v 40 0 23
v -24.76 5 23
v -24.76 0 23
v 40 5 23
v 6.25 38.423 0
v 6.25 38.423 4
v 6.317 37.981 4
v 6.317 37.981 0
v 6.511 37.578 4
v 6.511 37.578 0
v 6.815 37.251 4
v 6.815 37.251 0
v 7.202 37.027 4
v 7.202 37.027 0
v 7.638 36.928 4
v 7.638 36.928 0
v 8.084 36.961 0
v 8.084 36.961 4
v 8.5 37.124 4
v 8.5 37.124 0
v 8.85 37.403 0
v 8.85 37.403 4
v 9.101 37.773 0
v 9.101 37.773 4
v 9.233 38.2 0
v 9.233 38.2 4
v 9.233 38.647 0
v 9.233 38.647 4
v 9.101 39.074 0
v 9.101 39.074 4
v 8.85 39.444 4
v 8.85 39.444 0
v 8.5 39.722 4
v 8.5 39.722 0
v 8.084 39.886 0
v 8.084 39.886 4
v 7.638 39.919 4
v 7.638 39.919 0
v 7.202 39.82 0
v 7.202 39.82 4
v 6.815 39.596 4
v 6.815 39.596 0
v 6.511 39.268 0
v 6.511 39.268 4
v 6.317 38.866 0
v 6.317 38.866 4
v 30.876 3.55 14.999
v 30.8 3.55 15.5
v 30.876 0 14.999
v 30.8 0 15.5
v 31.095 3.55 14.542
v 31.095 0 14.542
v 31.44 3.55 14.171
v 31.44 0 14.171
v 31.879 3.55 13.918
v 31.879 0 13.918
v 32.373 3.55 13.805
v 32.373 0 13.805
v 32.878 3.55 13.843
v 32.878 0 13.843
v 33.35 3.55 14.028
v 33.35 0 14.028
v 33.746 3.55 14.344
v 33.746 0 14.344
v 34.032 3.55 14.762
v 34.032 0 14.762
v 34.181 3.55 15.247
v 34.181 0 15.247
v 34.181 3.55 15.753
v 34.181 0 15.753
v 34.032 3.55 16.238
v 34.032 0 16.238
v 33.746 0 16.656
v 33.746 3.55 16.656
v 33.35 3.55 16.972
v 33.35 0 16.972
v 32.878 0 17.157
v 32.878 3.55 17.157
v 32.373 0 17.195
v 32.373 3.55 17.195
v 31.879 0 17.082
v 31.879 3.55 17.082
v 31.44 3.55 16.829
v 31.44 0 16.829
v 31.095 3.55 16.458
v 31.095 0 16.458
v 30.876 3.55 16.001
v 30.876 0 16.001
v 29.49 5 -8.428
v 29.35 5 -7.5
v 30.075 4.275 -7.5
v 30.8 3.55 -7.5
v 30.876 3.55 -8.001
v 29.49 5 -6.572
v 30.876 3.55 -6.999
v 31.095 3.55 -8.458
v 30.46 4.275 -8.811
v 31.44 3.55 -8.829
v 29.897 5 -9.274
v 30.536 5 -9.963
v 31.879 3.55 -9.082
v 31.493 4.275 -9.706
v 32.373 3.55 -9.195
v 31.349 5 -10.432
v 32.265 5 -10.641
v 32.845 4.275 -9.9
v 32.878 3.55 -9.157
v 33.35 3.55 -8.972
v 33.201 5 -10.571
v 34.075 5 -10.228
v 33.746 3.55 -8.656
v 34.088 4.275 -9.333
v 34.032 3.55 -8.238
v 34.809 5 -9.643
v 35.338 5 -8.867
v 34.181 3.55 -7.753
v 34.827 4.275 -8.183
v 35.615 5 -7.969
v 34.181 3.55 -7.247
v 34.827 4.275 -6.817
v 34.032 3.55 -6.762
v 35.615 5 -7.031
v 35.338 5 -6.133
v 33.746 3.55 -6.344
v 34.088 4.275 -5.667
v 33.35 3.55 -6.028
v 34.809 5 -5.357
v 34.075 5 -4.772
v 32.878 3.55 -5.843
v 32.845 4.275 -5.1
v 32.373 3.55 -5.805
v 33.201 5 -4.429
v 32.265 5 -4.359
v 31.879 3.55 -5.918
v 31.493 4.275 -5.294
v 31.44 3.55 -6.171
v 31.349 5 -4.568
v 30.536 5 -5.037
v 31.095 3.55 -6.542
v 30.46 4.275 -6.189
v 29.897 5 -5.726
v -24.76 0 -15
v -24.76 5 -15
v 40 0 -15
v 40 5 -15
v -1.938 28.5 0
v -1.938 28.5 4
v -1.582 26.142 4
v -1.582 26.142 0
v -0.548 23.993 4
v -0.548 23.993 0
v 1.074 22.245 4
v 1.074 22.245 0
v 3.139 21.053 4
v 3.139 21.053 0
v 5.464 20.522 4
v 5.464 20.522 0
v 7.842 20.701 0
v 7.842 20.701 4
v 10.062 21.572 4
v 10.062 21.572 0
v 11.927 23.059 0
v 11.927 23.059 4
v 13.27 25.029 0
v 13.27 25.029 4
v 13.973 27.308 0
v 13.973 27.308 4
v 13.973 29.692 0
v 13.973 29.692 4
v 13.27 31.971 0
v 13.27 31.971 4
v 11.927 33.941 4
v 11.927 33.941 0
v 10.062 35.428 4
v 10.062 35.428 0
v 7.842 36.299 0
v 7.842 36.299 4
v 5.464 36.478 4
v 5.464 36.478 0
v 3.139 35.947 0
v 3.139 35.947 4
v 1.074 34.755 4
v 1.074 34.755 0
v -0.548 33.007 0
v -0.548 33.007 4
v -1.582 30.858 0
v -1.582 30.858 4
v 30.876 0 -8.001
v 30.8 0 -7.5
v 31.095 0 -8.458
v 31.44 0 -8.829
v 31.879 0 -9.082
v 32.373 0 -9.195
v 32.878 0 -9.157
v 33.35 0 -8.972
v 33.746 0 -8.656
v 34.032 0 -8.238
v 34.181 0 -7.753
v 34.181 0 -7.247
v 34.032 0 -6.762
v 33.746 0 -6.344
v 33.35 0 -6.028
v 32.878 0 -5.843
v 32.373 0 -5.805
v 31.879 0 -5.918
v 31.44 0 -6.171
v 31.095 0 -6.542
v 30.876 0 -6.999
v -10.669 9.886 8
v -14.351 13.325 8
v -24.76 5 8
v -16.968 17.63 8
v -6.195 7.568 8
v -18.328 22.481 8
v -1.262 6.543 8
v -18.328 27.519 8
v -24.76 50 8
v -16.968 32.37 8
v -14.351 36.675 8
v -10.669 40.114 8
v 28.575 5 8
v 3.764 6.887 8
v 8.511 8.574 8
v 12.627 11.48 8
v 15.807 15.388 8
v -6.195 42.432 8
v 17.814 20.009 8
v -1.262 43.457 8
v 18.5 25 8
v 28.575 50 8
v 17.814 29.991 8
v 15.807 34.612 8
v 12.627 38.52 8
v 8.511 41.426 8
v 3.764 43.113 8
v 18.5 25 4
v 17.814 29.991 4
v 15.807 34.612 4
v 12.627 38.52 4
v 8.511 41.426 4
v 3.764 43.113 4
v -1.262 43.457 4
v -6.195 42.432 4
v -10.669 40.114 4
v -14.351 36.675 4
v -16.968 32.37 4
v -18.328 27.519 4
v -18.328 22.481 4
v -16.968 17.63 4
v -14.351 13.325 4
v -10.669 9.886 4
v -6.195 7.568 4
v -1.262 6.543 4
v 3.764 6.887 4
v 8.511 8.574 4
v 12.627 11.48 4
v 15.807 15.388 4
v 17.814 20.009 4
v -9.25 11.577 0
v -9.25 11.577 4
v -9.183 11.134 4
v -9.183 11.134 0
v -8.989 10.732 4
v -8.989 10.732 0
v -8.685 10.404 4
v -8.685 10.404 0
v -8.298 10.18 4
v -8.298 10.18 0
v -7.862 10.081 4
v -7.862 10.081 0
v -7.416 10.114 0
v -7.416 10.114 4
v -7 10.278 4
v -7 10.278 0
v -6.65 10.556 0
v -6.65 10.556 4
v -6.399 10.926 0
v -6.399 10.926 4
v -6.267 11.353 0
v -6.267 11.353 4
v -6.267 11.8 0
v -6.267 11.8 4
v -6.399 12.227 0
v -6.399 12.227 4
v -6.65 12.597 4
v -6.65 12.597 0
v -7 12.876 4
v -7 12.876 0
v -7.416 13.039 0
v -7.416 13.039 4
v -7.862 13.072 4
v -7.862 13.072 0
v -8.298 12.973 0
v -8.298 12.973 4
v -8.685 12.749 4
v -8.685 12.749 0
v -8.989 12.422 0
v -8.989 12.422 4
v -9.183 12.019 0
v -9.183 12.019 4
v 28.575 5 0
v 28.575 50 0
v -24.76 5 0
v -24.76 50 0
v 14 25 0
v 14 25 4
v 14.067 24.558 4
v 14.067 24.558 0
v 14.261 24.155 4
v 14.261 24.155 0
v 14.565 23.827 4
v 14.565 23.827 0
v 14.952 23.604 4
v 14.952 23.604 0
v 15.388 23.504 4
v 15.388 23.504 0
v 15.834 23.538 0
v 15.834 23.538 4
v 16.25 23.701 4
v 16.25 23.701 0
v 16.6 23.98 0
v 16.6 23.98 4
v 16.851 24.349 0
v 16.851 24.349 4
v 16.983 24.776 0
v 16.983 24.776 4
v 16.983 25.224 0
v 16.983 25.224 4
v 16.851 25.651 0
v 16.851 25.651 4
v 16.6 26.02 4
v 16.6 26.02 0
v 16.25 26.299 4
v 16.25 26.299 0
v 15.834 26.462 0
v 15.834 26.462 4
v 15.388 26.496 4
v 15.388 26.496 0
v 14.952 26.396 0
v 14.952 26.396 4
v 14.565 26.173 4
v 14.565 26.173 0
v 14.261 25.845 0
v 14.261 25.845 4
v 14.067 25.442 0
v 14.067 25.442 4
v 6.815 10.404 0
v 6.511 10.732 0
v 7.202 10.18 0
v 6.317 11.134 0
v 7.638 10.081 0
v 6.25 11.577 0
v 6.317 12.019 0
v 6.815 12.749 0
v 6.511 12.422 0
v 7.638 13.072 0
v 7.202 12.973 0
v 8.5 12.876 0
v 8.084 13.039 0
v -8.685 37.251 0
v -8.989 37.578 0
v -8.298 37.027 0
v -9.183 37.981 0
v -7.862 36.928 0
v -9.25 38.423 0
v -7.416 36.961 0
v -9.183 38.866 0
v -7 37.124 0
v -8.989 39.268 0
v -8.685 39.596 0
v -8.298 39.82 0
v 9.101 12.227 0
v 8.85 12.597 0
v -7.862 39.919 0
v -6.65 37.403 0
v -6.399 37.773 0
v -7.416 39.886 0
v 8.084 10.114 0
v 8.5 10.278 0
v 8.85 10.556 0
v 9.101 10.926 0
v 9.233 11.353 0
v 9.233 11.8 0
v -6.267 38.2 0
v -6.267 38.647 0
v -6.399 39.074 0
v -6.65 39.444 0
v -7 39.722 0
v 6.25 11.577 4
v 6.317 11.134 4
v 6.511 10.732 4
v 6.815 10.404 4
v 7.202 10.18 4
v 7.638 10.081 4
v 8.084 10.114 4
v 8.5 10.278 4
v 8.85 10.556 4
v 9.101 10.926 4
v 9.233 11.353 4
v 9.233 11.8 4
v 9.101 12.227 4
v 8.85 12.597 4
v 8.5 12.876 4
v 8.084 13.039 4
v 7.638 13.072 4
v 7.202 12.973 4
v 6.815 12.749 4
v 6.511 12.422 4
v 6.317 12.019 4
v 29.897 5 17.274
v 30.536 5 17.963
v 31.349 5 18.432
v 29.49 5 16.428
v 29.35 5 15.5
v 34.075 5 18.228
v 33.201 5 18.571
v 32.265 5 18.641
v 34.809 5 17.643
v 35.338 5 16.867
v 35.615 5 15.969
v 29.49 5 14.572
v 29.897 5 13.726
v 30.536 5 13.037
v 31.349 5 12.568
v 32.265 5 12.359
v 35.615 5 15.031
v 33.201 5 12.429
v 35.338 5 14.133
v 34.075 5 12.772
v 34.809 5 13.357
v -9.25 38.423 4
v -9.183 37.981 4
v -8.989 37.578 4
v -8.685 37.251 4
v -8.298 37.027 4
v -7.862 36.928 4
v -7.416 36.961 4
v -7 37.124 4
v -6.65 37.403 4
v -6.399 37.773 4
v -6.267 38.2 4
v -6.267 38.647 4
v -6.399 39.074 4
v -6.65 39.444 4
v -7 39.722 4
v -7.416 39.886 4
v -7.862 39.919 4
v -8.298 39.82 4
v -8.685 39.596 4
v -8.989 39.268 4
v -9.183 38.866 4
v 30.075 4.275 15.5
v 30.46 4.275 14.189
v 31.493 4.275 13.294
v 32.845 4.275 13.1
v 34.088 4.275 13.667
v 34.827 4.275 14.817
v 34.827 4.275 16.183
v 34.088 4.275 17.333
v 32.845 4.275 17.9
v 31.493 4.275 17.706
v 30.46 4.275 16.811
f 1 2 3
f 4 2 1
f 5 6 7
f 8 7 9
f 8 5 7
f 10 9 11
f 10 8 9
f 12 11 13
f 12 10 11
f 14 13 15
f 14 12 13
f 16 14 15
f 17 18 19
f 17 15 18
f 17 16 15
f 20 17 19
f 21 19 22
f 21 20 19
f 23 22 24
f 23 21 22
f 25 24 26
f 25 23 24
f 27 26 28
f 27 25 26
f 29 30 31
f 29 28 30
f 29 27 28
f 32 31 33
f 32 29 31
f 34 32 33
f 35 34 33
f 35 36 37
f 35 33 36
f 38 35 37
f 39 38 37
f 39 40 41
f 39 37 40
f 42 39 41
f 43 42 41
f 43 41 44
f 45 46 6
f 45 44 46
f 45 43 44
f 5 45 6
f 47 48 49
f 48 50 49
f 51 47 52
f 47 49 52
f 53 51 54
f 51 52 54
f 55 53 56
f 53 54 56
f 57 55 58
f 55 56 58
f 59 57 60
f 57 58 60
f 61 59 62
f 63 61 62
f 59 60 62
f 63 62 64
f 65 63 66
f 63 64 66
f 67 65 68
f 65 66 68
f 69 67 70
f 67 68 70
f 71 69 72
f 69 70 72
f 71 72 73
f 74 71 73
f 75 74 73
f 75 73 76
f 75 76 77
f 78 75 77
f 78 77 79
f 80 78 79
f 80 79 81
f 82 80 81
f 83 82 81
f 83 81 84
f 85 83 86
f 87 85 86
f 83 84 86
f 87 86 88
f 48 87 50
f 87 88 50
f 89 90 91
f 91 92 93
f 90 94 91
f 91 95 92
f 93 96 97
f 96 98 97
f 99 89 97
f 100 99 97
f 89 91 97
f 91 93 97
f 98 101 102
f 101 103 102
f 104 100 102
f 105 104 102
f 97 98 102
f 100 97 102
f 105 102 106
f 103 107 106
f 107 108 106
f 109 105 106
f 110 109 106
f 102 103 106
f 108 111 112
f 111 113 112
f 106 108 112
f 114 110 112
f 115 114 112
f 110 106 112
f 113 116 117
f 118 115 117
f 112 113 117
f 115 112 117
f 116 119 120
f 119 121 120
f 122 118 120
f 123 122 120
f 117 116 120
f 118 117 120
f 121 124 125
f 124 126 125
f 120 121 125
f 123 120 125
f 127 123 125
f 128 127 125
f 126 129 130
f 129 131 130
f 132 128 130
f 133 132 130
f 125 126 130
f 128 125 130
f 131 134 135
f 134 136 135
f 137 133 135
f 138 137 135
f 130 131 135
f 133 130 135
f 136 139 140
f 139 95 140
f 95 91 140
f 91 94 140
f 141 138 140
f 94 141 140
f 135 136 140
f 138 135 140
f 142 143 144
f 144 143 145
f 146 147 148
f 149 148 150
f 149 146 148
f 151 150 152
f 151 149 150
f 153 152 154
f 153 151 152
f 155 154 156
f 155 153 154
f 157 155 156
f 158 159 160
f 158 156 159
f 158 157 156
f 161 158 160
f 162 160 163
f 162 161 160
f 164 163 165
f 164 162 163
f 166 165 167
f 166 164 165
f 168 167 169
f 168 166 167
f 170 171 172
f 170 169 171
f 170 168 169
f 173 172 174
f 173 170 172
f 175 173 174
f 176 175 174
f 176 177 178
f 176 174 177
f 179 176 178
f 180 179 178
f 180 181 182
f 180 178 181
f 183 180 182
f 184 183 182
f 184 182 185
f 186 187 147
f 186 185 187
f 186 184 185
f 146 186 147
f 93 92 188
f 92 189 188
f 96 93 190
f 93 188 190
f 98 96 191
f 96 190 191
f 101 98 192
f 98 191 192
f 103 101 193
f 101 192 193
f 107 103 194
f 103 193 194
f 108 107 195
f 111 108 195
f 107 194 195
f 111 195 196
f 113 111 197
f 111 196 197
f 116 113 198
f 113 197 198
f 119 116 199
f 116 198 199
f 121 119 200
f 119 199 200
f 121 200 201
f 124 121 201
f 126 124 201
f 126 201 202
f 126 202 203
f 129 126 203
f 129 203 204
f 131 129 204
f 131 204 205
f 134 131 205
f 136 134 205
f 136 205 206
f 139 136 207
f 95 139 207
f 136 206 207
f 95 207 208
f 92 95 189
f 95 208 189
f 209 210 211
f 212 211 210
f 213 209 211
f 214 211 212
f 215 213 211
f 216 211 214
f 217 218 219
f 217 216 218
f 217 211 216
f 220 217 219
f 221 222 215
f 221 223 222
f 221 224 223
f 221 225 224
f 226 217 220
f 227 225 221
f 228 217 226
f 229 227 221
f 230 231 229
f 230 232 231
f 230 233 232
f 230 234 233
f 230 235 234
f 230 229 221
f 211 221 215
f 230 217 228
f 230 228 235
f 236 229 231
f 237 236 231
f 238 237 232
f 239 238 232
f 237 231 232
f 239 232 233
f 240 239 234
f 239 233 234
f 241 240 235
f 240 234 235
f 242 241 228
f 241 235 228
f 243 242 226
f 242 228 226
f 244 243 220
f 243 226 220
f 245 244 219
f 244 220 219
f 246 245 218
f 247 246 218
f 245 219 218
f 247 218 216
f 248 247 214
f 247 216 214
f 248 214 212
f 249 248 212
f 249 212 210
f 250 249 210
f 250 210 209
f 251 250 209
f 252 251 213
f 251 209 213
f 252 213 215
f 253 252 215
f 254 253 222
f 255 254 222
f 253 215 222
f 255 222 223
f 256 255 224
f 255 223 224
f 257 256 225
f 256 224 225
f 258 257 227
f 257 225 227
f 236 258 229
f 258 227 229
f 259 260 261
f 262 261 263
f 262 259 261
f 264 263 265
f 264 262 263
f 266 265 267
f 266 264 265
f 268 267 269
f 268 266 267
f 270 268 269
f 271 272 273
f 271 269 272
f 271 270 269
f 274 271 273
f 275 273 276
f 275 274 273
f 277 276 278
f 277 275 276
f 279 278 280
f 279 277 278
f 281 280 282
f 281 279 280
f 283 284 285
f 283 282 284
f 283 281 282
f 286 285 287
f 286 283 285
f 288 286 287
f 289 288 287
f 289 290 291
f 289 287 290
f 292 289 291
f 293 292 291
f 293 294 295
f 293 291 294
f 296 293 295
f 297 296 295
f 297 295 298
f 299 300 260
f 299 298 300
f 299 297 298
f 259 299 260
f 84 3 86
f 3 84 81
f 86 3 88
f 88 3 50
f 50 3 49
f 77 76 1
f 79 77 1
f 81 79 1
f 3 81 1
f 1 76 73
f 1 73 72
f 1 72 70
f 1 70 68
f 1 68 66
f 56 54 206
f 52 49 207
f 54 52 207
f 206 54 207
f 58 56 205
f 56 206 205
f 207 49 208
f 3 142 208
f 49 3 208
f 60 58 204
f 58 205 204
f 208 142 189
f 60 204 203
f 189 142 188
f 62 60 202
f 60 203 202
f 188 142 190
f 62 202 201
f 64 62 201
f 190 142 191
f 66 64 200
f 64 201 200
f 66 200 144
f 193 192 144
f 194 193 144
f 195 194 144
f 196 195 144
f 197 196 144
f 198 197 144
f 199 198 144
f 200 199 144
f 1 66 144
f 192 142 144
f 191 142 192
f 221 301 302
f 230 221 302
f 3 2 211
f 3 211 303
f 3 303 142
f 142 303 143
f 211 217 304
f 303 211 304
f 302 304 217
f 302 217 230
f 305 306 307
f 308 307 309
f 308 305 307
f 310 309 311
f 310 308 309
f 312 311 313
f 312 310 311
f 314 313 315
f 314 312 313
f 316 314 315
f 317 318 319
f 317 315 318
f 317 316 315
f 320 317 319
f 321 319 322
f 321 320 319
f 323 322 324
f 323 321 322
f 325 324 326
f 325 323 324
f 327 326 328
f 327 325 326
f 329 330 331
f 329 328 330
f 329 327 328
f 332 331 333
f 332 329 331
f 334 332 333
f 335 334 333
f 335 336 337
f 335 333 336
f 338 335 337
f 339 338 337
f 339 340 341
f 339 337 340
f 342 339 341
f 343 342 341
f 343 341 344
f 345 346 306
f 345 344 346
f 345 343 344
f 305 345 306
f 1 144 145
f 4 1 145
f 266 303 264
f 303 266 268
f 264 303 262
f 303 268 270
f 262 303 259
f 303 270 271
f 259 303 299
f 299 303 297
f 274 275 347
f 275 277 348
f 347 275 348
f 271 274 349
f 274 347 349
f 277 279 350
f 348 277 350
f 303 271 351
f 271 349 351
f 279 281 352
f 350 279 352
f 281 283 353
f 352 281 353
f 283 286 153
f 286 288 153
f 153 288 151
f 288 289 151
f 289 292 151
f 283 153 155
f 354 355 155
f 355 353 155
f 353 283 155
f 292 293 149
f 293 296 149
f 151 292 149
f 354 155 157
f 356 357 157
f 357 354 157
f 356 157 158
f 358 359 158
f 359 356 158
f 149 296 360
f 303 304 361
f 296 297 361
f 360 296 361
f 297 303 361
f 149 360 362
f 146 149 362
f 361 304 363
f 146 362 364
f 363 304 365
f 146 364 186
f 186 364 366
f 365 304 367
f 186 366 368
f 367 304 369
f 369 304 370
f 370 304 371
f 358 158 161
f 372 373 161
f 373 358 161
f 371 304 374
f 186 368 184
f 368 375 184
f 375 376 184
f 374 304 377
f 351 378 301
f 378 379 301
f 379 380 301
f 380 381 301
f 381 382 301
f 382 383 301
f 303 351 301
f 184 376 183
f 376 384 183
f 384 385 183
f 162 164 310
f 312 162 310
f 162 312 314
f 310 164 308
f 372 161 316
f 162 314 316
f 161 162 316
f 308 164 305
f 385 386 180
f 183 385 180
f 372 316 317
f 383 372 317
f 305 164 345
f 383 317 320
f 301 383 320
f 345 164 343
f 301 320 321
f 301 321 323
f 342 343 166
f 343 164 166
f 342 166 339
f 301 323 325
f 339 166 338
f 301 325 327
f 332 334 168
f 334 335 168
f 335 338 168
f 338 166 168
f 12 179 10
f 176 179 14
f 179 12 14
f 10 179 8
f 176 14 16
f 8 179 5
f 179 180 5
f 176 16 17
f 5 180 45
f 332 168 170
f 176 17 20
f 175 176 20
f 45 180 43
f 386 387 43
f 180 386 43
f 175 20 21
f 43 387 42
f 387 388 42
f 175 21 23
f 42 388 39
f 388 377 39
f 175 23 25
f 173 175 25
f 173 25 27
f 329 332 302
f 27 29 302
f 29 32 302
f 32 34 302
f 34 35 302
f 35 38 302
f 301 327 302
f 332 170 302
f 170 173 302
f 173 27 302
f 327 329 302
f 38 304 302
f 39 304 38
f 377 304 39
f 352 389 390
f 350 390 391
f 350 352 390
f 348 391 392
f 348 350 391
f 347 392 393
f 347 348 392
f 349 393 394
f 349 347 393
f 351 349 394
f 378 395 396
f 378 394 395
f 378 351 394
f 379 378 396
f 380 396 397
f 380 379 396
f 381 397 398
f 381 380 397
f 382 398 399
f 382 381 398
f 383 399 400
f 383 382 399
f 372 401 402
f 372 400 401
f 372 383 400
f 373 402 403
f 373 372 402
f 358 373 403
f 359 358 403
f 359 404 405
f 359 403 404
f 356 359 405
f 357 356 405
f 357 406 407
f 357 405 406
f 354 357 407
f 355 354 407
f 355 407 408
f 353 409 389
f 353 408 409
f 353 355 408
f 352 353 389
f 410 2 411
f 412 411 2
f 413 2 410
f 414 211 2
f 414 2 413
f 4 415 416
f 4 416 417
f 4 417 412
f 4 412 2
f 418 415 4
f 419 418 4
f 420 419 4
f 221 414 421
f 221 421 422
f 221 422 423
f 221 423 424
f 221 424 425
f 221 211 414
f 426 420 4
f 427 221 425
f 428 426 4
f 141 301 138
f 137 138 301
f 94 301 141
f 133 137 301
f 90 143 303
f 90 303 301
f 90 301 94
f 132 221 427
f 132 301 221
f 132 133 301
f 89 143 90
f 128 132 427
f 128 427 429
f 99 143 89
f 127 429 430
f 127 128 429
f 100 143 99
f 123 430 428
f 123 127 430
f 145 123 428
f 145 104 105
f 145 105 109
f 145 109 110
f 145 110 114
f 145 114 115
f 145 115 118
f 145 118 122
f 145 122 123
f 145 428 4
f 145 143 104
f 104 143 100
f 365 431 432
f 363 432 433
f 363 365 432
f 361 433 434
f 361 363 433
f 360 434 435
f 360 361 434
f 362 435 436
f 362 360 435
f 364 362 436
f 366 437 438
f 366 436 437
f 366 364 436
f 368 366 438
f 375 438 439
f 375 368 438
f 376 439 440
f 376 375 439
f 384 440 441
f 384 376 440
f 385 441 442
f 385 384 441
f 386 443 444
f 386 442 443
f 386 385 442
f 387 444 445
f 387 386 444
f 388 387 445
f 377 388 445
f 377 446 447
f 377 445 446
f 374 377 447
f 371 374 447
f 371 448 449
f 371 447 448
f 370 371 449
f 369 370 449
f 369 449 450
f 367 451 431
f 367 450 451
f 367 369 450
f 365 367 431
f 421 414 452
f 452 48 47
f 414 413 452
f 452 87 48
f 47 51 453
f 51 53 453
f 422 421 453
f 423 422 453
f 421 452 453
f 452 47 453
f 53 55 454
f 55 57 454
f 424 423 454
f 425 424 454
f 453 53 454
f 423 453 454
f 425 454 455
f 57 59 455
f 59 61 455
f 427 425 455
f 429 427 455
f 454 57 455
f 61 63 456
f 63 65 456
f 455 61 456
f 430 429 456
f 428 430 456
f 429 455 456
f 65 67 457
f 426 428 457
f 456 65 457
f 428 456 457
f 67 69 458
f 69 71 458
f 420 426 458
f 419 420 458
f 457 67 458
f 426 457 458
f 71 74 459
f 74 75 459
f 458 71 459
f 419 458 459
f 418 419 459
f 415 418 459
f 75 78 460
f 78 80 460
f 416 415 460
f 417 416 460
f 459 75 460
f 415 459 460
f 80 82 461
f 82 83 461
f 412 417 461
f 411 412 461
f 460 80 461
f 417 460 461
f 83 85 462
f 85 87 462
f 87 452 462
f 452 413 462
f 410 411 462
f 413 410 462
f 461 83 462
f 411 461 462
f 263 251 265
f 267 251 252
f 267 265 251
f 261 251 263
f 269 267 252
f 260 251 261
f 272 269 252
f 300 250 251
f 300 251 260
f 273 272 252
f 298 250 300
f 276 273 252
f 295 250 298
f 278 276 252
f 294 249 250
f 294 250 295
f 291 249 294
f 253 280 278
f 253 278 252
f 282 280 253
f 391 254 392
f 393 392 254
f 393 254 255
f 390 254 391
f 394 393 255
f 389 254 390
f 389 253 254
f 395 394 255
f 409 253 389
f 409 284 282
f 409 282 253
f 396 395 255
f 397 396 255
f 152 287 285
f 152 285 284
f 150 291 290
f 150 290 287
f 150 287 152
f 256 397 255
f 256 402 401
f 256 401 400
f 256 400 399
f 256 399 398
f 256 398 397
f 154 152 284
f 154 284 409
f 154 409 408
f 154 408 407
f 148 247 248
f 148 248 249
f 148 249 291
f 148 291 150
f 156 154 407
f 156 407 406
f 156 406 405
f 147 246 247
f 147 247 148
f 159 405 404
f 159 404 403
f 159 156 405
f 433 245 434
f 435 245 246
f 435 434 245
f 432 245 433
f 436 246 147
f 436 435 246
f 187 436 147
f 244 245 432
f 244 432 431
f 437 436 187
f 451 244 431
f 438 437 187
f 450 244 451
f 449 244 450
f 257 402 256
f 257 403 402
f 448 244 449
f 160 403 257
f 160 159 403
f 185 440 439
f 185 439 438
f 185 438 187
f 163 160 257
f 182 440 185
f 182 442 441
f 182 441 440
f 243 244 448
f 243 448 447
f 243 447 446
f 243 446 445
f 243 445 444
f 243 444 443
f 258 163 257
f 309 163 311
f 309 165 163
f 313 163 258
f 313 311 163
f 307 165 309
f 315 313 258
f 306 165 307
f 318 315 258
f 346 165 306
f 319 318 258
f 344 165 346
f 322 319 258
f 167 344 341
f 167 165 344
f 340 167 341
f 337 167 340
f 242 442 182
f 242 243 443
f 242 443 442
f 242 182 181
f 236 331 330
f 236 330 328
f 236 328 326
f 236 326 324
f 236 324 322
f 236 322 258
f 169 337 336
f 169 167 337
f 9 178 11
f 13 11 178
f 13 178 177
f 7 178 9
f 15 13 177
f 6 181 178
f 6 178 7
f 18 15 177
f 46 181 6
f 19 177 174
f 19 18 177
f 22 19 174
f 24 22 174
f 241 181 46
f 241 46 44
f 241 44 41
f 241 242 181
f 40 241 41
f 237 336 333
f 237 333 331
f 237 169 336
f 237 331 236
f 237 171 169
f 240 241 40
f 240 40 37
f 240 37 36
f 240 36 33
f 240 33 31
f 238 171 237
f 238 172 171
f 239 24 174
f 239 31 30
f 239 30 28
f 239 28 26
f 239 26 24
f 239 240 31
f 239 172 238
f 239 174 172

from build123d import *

# Parameters (mm, degrees)
SKETCH3_W                                       = 57.15
SKETCH3_H                                       = 50
BOSS_EXTRUDE1_DEPTH                             = 8
SKETCH3_3_R                                     = 1.5
SKETCH3_3_R_2                                   = 8
CUT_EXTRUDE2_DEPTH                              = 10
SKETCH4_R                                       = 18.5
CUT_EXTRUDE3_DEPTH                              = 4
BOSS_EXTRUDE2_DEPTH                             = 15
BOSS_EXTRUDE2_DEPTH_BACK                        = 23
SKETCH6_W                                       = 80
SKETCH6_H                                       = 5
CSK_FOR_M3_FLAT_HEAD_MACHINE_SCREW1_D           = 3.4
CSK_FOR_M3_FLAT_HEAD_MACHINE_SCREW1_CSINK_D     = 6.3
CSK_FOR_M3_FLAT_HEAD_MACHINE_SCREW1_CSINK_ANGLE = 90
CUT_EXTRUDE8_REACH                              = 66.452
SKETCH14_W                                      = 15.24
SKETCH14_H                                      = 38
CUT_EXTRUDE8_DIRECTION_2_DEPTH                  = 45


with BuildPart() as part:
    # Sketch3 → Boss-Extrude1 (new body)
    with BuildSketch(Plane.XY):
        with Locations((0, 25)):
            Rectangle(SKETCH3_W, SKETCH3_H)
    extrude(amount=BOSS_EXTRUDE1_DEPTH)

    # Sketch3<3> → Cut-Extrude2 (cut)
    with BuildSketch(Plane.XY):
        with Locations(Location((-7.75, 38.423393759, 0), (0, 0, 180))):
            Circle(SKETCH3_3_R)
        with Locations(Location((7.75, 38.423393759, 0), (0, 0, 180))):
            Circle(SKETCH3_3_R)
        with Locations(Location((-7.75, 11.576606241, 0), (0, 0, 180))):
            Circle(SKETCH3_3_R)
        with Locations(Location((7.75, 11.576606241, 0), (0, 0, 180))):
            Circle(SKETCH3_3_R)
        with Locations(Location((15.5, 25, 0), (0, 0, 180))):
            Circle(SKETCH3_3_R)
        with Locations(Location((6.062177825, 28.499999999, 0), (0, 0, 180))):
            Circle(SKETCH3_3_R_2)
    extrude(amount=CUT_EXTRUDE2_DEPTH, mode=Mode.SUBTRACT)

    # Sketch4 → Cut-Extrude3 (cut)
    with BuildSketch(Plane.XY.offset(8)):
        with Locations((0, 25)):
            Circle(SKETCH4_R)
    extrude(amount=-CUT_EXTRUDE3_DEPTH, mode=Mode.SUBTRACT)

    # Sketch6 → Boss-Extrude2 (add, two sides: drawn at the far end of the back side and taken through both)
    with BuildSketch(Plane.XY.offset(8).offset(-BOSS_EXTRUDE2_DEPTH_BACK)):
        with Locations((0, 2.5)):
            Rectangle(SKETCH6_W, SKETCH6_H)
    extrude(amount=BOSS_EXTRUDE2_DEPTH + BOSS_EXTRUDE2_DEPTH_BACK)

    # CSK for M3 Flat Head Machine Screw1 (through all)
    with Locations(Plane(origin=(0, 5, 0), x_dir=(1, 0, 0), z_dir=(0, 1, 0))):
        with Locations((-32.5, 7.5), (-32.5, -15.5), (32.5, -15.5), (32.5, 7.5)):
            CounterSinkHole(CSK_FOR_M3_FLAT_HEAD_MACHINE_SCREW1_D / 2, CSK_FOR_M3_FLAT_HEAD_MACHINE_SCREW1_CSINK_D / 2, counter_sink_angle=CSK_FOR_M3_FLAT_HEAD_MACHINE_SCREW1_CSINK_ANGLE)

    # Sketch14 → Cut-Extrude8 (cut, up to next)
    with BuildSketch(Plane(origin=(0, 5, 0), x_dir=(1, 0, 0), z_dir=(0, 1, 0)), mode=Mode.PRIVATE) as cut_extrude8_sk1:
        with Locations((-32.38, -4)):
            Rectangle(SKETCH14_W, SKETCH14_H)
    cut_extrude8_tool1 = extrude(cut_extrude8_sk1.sketch, amount=-CUT_EXTRUDE8_REACH, mode=Mode.PRIVATE) & part.part
    add(cut_extrude8_tool1.solids().sort_by_distance((-32.38, 5, 4))[0], mode=Mode.SUBTRACT)

    # Sketch14 → Cut-Extrude8 direction 2 (cut)
    with BuildSketch(Plane(origin=(0, 5, 0), x_dir=(1, 0, 0), z_dir=(0, 1, 0))):
        with Locations((-32.38, -4)):
            Rectangle(SKETCH14_W, SKETCH14_H)
    extrude(amount=CUT_EXTRUDE8_DIRECTION_2_DEPTH, mode=Mode.SUBTRACT)


solid = part.part
